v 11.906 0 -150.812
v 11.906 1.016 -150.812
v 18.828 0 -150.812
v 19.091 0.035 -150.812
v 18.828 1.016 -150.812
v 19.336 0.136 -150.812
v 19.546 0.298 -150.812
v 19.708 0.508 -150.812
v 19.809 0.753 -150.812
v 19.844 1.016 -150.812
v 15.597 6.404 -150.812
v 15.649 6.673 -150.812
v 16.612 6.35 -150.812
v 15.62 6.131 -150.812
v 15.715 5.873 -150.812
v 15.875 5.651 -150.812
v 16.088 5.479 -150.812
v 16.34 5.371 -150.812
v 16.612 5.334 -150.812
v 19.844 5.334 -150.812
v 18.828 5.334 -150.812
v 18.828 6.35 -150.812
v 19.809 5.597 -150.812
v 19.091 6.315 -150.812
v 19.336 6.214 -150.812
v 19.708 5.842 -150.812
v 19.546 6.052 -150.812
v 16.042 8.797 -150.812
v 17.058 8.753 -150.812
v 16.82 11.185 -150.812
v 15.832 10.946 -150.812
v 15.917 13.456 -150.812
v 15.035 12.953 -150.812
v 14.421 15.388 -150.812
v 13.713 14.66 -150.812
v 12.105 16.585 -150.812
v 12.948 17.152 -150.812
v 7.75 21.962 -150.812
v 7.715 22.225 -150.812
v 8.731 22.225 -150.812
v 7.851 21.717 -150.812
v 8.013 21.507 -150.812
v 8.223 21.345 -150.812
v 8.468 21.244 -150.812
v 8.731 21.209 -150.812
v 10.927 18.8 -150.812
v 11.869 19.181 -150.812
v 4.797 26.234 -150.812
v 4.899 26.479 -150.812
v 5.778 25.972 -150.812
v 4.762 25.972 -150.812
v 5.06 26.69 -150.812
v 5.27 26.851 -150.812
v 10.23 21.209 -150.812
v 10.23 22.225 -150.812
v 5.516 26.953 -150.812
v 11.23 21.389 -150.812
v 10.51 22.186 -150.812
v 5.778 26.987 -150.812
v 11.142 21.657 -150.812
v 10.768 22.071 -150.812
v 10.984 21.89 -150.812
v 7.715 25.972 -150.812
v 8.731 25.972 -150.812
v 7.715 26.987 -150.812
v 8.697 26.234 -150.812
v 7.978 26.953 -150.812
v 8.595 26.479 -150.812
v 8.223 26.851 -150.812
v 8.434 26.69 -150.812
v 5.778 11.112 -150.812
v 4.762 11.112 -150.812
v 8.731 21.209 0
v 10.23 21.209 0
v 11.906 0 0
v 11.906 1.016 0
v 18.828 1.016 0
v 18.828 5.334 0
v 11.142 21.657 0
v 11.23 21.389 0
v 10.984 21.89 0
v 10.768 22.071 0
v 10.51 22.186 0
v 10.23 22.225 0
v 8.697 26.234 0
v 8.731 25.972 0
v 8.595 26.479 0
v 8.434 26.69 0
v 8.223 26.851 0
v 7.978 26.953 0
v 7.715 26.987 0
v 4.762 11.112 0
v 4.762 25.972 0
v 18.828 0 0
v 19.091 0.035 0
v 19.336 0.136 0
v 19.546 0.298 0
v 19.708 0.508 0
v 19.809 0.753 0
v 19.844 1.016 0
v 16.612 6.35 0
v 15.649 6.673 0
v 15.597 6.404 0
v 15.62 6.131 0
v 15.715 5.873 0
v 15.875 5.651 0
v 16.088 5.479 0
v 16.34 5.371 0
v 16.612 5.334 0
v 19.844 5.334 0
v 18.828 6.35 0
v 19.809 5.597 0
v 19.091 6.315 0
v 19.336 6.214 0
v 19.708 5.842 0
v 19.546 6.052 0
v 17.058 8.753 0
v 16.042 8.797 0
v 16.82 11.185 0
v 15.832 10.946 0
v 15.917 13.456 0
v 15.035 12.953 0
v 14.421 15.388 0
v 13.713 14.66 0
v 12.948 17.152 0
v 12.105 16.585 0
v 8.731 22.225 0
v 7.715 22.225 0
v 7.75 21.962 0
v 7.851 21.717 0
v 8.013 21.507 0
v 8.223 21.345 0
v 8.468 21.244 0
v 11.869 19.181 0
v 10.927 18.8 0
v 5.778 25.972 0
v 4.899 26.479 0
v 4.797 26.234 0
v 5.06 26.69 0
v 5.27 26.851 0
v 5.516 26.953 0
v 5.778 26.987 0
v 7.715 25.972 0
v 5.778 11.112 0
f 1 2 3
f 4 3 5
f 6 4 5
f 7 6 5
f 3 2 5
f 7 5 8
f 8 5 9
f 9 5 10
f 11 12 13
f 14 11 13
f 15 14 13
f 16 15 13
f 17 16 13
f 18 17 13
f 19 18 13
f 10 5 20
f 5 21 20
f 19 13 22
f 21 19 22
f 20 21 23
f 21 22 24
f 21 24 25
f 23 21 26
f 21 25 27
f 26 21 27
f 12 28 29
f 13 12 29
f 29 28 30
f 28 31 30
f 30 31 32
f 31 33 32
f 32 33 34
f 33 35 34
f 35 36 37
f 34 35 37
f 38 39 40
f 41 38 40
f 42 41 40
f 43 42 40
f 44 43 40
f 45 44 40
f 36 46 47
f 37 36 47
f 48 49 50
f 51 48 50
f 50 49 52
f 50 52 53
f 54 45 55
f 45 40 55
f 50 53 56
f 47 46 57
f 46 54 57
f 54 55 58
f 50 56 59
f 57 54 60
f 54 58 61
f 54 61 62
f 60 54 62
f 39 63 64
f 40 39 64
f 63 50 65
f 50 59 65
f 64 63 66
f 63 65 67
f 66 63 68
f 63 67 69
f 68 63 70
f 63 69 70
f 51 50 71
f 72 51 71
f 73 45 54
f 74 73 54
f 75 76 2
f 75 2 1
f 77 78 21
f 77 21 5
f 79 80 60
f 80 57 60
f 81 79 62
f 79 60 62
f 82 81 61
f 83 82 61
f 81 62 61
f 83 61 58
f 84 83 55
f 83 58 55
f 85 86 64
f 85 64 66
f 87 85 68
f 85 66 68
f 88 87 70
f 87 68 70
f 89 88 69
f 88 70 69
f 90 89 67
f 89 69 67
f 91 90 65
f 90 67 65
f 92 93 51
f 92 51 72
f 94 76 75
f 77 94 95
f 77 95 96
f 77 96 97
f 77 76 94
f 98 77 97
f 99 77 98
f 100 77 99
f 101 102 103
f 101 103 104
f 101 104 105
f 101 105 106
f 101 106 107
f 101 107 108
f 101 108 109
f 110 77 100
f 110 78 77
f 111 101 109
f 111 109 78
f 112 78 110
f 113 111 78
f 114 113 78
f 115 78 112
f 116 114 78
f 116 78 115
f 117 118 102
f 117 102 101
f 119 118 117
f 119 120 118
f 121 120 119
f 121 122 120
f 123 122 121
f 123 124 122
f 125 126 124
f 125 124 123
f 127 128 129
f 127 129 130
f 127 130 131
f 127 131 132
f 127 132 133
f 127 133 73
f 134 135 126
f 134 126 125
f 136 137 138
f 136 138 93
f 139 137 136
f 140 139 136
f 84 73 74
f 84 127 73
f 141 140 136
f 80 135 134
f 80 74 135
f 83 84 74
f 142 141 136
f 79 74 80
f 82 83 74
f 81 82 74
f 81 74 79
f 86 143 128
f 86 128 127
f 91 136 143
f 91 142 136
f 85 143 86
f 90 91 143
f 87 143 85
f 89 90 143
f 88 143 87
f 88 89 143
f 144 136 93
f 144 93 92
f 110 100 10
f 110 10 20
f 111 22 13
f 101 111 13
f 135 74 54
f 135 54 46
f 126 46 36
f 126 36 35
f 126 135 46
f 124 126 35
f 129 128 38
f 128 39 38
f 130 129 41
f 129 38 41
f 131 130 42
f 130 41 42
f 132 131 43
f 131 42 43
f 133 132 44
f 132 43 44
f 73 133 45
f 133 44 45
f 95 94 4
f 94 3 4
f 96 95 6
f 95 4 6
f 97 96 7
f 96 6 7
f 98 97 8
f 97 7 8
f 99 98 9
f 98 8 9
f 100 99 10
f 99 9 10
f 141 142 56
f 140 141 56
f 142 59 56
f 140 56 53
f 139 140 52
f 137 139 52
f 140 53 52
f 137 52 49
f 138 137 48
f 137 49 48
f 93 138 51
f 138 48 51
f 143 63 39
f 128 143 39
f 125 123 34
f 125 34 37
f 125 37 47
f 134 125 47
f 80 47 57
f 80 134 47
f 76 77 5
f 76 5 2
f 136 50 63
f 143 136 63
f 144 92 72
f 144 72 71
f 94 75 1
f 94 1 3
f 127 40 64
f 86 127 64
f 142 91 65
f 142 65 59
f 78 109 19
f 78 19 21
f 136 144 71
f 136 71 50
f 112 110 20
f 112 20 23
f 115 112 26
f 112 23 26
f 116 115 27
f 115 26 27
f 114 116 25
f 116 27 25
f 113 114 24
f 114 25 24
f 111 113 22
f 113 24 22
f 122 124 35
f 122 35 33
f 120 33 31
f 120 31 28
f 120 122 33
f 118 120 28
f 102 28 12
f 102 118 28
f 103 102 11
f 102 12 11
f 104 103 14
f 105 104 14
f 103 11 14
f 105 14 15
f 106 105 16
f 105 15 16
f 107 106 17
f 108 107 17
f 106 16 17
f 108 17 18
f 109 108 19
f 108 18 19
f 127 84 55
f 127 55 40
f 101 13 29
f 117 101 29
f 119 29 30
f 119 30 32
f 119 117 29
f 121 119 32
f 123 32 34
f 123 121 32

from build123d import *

# Parameters (mm, degrees)
EXTRUDE_THIN1_DEPTH = 150.8125
FILLET1_R           = 1.016


with BuildPart() as part:
    # Sketch1 → Extrude-Thin1 (new body)
    with BuildSketch(Plane.XY):
        with BuildLine():
            Line((11.90625, 0), (19.84375, 0))
            Line((19.84375, 0), (19.84375, 6.35))
            Line((19.84375, 6.35), (16.611859403, 6.35))
            ThreePointArc((16.611859403, 6.35), (16.819864191, 11.185113028), (14.420873366, 15.388257922))
            ThreePointArc((14.420873366, 15.388257922), (12.164462393, 18.51520612), (11.1125, 22.225))
            Line((11.1125, 22.225), (8.73125, 22.225))
            Line((8.73125, 22.225), (8.73125, 26.9875))
            Line((8.73125, 26.9875), (4.7625, 26.9875))
            Line((4.7625, 26.9875), (4.7625, 11.1125))
            Line((4.7625, 11.1125), (5.7785, 11.1125))
            Line((5.7785, 11.1125), (5.7785, 25.9715))
            Line((5.7785, 25.9715), (7.71525, 25.9715))
            Line((7.71525, 25.9715), (7.71525, 21.209))
            Line((7.71525, 21.209), (10.230316486, 21.209))
            ThreePointArc((10.230316486, 21.209), (11.458524166, 17.661660911), (13.712626283, 14.659806091))
            ThreePointArc((13.712626283, 14.659806091), (15.971237356, 10.225128152), (15.052239099, 5.334))
            Line((15.052239099, 5.334), (18.82775, 5.334))
            Line((18.82775, 5.334), (18.82775, 1.016))
            Line((18.82775, 1.016), (11.90625, 1.016))
            Line((11.90625, 1.016), (11.90625, 0))
        make_face()
    extrude(amount=-EXTRUDE_THIN1_DEPTH)

    # Fillet1
    fillet1_edges = [part.edges().sort_by_distance(p)[0] for p in [
        (4.7625, 26.9875, -75.40625),
        (8.73125, 26.9875, -75.40625),
        (11.1125, 22.225, -75.40625),
        (19.84375, 6.35, -75.40625),
        (19.84375, 0, -75.40625),
        (15.052239099, 5.334, -75.40625),
        (7.71525, 21.209, -75.40625),
    ]]
    fillet(fillet1_edges, radius=FILLET1_R)


solid = part.part
